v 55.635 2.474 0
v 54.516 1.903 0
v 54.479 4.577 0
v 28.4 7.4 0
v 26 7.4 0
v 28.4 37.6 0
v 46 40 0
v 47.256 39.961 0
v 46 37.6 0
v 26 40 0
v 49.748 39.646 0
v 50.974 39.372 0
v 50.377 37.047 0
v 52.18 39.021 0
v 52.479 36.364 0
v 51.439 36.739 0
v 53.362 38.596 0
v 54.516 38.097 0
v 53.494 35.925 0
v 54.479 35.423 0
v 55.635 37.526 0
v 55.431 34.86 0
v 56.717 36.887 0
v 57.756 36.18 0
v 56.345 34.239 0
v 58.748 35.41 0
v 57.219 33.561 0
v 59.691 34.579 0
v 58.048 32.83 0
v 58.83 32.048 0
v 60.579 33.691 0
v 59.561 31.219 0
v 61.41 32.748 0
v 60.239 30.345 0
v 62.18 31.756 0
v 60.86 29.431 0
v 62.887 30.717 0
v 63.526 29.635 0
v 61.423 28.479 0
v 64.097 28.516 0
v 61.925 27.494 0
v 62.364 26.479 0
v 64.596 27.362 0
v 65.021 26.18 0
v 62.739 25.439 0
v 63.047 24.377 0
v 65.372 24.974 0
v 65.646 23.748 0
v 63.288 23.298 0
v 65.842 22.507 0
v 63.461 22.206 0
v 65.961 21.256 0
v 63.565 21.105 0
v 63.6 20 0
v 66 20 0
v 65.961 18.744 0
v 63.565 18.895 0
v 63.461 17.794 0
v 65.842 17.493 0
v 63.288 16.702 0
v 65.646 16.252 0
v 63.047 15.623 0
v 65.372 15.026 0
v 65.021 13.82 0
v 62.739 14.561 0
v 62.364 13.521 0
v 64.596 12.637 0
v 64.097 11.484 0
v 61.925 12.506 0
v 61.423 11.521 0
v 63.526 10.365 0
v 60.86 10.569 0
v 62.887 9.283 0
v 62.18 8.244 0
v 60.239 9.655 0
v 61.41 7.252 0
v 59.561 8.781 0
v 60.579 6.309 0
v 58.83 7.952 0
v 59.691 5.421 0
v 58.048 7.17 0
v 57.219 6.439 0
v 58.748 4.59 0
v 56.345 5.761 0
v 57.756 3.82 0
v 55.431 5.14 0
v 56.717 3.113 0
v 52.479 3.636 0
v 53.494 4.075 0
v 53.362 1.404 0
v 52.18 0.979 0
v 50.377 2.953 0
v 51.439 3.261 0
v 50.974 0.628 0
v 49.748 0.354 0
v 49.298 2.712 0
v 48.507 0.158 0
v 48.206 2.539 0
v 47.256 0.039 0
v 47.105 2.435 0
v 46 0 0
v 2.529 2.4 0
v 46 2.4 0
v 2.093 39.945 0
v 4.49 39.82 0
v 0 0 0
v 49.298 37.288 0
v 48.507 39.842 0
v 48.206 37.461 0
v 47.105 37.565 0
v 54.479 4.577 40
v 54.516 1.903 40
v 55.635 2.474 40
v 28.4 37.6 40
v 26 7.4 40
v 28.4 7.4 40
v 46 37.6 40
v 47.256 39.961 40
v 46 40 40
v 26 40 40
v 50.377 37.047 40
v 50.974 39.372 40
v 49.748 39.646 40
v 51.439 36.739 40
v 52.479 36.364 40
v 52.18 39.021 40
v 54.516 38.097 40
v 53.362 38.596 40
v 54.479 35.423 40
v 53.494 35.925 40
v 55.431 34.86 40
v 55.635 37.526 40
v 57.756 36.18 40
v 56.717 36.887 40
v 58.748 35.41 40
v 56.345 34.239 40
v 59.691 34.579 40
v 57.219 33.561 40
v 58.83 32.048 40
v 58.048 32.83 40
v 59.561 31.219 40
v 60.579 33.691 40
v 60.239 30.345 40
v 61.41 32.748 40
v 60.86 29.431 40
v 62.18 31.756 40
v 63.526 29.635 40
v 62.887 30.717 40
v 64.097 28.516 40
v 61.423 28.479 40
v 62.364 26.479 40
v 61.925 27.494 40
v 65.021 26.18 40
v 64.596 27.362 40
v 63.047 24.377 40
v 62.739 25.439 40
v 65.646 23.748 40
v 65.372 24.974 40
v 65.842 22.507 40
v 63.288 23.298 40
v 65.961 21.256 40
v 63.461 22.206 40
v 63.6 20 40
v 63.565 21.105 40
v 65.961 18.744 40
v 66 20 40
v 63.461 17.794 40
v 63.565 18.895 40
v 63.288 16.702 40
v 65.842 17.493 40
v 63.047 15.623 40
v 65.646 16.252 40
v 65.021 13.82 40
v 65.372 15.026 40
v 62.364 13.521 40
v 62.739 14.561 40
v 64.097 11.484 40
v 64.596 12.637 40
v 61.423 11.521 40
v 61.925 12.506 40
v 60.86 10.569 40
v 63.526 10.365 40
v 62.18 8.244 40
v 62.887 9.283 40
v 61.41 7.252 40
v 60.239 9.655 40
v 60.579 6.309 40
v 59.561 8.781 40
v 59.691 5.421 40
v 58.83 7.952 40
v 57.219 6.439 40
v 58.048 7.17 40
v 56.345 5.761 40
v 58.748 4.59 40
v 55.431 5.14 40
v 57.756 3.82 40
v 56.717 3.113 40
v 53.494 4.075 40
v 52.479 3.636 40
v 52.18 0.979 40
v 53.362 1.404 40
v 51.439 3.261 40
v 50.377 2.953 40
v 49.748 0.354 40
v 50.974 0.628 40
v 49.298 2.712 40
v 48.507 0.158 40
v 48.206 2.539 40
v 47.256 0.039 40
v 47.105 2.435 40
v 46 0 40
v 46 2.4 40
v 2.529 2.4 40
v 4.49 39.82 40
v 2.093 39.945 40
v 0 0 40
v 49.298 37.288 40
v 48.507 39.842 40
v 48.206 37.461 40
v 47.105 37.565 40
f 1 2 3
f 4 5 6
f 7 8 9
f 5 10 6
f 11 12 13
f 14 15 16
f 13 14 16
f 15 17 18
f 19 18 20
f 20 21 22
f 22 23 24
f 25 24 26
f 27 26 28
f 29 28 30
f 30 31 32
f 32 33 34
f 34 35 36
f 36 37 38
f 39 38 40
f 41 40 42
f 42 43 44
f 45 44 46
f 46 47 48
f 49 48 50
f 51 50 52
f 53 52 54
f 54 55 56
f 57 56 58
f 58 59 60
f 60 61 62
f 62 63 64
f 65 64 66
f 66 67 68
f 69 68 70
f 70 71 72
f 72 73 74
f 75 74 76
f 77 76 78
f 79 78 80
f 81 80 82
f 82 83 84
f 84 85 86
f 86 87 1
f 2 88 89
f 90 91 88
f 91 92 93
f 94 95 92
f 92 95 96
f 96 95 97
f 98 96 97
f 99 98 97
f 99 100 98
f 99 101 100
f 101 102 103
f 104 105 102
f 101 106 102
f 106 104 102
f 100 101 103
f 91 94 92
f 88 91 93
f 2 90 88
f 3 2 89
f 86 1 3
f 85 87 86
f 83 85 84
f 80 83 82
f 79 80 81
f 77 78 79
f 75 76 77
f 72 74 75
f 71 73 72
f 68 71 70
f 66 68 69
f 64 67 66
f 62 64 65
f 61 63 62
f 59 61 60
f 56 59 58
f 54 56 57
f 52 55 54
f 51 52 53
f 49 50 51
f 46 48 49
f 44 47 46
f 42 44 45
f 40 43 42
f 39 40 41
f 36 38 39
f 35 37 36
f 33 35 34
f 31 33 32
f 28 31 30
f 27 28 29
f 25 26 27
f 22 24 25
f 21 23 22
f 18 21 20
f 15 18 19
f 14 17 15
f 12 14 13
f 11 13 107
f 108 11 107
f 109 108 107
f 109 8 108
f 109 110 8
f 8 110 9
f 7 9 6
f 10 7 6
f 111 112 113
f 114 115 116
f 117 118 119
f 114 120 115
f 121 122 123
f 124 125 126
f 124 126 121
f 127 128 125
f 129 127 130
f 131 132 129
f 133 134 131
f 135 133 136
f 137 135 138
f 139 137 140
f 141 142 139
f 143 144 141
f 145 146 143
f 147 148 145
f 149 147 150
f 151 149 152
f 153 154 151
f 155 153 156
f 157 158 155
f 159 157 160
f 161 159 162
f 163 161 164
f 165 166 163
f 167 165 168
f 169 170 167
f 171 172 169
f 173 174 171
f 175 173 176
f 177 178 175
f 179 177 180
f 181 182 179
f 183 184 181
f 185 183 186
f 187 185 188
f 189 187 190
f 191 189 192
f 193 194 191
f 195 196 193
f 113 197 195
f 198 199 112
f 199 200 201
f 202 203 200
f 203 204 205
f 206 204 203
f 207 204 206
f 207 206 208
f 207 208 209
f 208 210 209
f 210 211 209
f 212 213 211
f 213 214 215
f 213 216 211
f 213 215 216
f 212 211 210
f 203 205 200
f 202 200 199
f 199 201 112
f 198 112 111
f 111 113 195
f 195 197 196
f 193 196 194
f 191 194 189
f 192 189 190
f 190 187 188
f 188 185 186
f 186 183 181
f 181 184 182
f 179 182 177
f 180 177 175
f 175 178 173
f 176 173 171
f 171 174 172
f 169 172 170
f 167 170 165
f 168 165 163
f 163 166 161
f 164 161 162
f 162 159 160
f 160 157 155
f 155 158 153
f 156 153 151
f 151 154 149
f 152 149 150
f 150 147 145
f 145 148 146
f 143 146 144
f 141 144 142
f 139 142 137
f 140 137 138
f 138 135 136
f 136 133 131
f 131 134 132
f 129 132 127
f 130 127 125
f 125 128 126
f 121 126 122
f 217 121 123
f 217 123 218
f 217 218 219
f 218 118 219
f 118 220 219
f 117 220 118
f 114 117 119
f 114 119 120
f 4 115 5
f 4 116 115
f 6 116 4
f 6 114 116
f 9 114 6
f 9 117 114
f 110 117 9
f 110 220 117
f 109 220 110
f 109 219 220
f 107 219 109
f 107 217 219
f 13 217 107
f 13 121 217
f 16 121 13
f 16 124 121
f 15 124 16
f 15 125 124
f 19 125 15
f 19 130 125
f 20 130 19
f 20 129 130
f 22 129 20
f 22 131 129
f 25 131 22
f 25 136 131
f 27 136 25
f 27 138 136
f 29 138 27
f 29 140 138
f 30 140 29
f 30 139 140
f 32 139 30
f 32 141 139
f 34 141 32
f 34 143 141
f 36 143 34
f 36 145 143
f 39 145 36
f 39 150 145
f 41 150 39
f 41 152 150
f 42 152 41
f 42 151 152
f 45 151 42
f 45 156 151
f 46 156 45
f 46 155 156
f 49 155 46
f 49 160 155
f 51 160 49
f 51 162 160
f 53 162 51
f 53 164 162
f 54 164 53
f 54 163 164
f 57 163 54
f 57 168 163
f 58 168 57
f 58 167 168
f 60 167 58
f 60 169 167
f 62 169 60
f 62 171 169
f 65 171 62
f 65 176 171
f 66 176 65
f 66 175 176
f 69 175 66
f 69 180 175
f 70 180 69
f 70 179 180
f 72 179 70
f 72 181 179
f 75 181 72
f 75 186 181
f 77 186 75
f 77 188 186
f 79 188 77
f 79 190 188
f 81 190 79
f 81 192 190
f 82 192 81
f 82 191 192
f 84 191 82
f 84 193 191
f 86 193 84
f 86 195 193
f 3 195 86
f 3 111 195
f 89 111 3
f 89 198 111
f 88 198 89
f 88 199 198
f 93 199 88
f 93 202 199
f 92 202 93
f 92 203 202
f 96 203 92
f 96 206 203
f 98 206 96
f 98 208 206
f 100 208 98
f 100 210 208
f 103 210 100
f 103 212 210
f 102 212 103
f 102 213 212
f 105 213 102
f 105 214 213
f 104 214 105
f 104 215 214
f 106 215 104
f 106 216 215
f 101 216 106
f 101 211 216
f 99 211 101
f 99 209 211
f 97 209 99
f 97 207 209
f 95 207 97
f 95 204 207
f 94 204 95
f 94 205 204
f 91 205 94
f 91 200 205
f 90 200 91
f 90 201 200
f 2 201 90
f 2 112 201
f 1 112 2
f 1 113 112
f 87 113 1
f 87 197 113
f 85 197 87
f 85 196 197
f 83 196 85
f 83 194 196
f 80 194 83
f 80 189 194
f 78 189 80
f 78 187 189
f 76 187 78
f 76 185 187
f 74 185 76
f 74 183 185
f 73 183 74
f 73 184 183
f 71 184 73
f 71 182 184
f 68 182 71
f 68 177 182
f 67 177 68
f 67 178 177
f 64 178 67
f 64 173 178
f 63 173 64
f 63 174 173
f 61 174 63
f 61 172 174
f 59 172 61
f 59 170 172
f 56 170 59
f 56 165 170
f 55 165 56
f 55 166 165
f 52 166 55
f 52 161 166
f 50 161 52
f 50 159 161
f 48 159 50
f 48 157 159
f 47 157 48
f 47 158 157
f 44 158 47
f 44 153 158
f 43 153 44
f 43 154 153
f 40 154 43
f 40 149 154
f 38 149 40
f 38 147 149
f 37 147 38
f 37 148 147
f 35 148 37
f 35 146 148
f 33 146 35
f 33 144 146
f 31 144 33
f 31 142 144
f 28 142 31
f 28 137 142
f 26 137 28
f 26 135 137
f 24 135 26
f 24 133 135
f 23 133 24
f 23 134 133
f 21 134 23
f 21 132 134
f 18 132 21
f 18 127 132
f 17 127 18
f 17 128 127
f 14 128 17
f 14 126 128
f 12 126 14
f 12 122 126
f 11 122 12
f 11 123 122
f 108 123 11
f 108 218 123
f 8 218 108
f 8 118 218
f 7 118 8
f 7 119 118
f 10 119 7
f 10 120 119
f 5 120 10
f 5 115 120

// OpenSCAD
// Desk Cable Hugger v3

// Customizable desk hugger to organize cables.

// v1: https://www.thingiverse.com/thing:782152
// v2: https://www.thingiverse.com/thing:5256328

/* [Object Parameters] */
// Thickness of desktop (mm)
desk_thickness = 26; // [1:100]

// Gap for inserting cables (mm)
cable_gap = 5;

// Angle of the top of the clamp so that it has a better grip on the table (degrees)
clamp_angle = 3; // [0:10]

// Diameter of the bottom half circle
diameter_holder = 40;

// Width of the desk hugger (z-height)
clamp_width = 40;

// Offset added to desk_thickness
clamp_offset = 0;

/* [Printer Parameters] */
// Diameter of the printer nozzle 
nozzle = 0.4;
// Number of lines to be printed
n_lines = 6;

// Derived Variables
thickness = n_lines * nozzle;
desk_width = desk_thickness - clamp_offset;

// Rename variables for brevity
w = clamp_width;
d = diameter_holder;
r = d / 2;
l = desk_width + r;
t = -clamp_angle;

module top(thickness, length, angle)
{
    rotate(a = [ 0, 0, t ])
    {
        square(size = [ thickness, d ]);
    }
}

linear_extrude(w)
{
    union()
    {
        // To remove any outcropping from rotating the top square
        // We will find the difference between the top bracket and any
        // solid NOT in both the top and the left part of the bracket
        // That is, in the corner, any solid must be part of both the top
        // and the left part of the bracket, not either individually
        // This removes material that appeares to the "left" (negative on the y-axis).
        difference()
        {
            top(thickness, d, t);
            difference()
            {
                // This x-length is deliberately thickness * 3,
                // not * 2, beacuse extreme angles can have an outcrop
                square(center = true, size = [ thickness * 3, thickness * 2 ]);
                intersection()
                {
                    top(thickness, d, t);
                    square(size = [ l, thickness ]);
                }
            }
        }
        // We apply the same logic here, but with the left square. Any material
        // not in both the top and left bracket is excluded. This removes material
        // from rotating that appears "above" (negative on the x-axis) the hook.
        difference()
        {
            square(size = [ l, thickness ]);
            difference()
            {
                square(center = true, size = [ thickness * 2, thickness * 2 ]);
                intersection()
                {
                    top(thickness, d, t);
                    square(size = [ l, thickness ]);
                }
            }
        }
        // This creates the half circle for the hook
        difference()
        {
            translate(v = [ l, r ])
            {
                circle($fn = 100, d = d);
            }
            translate(v = [ l, r ])
            {
                circle($fn = 100, d = d - (thickness * 2));
            }
            // This removes the upper half of the circle to create the semi-circle
            translate(v = [ desk_width + (r / 2), r ])
            {
                square(center = true, size = [ r, d ]);
            }
        }
        // This is the part that extends up from the semi-circle
        translate(v = [ desk_width, d - thickness ])
        {
            square(size = [ r, thickness ]);
        }
        // This is the part that goes under the desk, and is
        // the diameter of the hook minus the cable gap
        // We must offset by thickness + cable gap
        translate(v = [ desk_width, thickness + cable_gap ])
        {
            square(size = [ thickness, d - cable_gap - thickness ]);
        }
    }
}
